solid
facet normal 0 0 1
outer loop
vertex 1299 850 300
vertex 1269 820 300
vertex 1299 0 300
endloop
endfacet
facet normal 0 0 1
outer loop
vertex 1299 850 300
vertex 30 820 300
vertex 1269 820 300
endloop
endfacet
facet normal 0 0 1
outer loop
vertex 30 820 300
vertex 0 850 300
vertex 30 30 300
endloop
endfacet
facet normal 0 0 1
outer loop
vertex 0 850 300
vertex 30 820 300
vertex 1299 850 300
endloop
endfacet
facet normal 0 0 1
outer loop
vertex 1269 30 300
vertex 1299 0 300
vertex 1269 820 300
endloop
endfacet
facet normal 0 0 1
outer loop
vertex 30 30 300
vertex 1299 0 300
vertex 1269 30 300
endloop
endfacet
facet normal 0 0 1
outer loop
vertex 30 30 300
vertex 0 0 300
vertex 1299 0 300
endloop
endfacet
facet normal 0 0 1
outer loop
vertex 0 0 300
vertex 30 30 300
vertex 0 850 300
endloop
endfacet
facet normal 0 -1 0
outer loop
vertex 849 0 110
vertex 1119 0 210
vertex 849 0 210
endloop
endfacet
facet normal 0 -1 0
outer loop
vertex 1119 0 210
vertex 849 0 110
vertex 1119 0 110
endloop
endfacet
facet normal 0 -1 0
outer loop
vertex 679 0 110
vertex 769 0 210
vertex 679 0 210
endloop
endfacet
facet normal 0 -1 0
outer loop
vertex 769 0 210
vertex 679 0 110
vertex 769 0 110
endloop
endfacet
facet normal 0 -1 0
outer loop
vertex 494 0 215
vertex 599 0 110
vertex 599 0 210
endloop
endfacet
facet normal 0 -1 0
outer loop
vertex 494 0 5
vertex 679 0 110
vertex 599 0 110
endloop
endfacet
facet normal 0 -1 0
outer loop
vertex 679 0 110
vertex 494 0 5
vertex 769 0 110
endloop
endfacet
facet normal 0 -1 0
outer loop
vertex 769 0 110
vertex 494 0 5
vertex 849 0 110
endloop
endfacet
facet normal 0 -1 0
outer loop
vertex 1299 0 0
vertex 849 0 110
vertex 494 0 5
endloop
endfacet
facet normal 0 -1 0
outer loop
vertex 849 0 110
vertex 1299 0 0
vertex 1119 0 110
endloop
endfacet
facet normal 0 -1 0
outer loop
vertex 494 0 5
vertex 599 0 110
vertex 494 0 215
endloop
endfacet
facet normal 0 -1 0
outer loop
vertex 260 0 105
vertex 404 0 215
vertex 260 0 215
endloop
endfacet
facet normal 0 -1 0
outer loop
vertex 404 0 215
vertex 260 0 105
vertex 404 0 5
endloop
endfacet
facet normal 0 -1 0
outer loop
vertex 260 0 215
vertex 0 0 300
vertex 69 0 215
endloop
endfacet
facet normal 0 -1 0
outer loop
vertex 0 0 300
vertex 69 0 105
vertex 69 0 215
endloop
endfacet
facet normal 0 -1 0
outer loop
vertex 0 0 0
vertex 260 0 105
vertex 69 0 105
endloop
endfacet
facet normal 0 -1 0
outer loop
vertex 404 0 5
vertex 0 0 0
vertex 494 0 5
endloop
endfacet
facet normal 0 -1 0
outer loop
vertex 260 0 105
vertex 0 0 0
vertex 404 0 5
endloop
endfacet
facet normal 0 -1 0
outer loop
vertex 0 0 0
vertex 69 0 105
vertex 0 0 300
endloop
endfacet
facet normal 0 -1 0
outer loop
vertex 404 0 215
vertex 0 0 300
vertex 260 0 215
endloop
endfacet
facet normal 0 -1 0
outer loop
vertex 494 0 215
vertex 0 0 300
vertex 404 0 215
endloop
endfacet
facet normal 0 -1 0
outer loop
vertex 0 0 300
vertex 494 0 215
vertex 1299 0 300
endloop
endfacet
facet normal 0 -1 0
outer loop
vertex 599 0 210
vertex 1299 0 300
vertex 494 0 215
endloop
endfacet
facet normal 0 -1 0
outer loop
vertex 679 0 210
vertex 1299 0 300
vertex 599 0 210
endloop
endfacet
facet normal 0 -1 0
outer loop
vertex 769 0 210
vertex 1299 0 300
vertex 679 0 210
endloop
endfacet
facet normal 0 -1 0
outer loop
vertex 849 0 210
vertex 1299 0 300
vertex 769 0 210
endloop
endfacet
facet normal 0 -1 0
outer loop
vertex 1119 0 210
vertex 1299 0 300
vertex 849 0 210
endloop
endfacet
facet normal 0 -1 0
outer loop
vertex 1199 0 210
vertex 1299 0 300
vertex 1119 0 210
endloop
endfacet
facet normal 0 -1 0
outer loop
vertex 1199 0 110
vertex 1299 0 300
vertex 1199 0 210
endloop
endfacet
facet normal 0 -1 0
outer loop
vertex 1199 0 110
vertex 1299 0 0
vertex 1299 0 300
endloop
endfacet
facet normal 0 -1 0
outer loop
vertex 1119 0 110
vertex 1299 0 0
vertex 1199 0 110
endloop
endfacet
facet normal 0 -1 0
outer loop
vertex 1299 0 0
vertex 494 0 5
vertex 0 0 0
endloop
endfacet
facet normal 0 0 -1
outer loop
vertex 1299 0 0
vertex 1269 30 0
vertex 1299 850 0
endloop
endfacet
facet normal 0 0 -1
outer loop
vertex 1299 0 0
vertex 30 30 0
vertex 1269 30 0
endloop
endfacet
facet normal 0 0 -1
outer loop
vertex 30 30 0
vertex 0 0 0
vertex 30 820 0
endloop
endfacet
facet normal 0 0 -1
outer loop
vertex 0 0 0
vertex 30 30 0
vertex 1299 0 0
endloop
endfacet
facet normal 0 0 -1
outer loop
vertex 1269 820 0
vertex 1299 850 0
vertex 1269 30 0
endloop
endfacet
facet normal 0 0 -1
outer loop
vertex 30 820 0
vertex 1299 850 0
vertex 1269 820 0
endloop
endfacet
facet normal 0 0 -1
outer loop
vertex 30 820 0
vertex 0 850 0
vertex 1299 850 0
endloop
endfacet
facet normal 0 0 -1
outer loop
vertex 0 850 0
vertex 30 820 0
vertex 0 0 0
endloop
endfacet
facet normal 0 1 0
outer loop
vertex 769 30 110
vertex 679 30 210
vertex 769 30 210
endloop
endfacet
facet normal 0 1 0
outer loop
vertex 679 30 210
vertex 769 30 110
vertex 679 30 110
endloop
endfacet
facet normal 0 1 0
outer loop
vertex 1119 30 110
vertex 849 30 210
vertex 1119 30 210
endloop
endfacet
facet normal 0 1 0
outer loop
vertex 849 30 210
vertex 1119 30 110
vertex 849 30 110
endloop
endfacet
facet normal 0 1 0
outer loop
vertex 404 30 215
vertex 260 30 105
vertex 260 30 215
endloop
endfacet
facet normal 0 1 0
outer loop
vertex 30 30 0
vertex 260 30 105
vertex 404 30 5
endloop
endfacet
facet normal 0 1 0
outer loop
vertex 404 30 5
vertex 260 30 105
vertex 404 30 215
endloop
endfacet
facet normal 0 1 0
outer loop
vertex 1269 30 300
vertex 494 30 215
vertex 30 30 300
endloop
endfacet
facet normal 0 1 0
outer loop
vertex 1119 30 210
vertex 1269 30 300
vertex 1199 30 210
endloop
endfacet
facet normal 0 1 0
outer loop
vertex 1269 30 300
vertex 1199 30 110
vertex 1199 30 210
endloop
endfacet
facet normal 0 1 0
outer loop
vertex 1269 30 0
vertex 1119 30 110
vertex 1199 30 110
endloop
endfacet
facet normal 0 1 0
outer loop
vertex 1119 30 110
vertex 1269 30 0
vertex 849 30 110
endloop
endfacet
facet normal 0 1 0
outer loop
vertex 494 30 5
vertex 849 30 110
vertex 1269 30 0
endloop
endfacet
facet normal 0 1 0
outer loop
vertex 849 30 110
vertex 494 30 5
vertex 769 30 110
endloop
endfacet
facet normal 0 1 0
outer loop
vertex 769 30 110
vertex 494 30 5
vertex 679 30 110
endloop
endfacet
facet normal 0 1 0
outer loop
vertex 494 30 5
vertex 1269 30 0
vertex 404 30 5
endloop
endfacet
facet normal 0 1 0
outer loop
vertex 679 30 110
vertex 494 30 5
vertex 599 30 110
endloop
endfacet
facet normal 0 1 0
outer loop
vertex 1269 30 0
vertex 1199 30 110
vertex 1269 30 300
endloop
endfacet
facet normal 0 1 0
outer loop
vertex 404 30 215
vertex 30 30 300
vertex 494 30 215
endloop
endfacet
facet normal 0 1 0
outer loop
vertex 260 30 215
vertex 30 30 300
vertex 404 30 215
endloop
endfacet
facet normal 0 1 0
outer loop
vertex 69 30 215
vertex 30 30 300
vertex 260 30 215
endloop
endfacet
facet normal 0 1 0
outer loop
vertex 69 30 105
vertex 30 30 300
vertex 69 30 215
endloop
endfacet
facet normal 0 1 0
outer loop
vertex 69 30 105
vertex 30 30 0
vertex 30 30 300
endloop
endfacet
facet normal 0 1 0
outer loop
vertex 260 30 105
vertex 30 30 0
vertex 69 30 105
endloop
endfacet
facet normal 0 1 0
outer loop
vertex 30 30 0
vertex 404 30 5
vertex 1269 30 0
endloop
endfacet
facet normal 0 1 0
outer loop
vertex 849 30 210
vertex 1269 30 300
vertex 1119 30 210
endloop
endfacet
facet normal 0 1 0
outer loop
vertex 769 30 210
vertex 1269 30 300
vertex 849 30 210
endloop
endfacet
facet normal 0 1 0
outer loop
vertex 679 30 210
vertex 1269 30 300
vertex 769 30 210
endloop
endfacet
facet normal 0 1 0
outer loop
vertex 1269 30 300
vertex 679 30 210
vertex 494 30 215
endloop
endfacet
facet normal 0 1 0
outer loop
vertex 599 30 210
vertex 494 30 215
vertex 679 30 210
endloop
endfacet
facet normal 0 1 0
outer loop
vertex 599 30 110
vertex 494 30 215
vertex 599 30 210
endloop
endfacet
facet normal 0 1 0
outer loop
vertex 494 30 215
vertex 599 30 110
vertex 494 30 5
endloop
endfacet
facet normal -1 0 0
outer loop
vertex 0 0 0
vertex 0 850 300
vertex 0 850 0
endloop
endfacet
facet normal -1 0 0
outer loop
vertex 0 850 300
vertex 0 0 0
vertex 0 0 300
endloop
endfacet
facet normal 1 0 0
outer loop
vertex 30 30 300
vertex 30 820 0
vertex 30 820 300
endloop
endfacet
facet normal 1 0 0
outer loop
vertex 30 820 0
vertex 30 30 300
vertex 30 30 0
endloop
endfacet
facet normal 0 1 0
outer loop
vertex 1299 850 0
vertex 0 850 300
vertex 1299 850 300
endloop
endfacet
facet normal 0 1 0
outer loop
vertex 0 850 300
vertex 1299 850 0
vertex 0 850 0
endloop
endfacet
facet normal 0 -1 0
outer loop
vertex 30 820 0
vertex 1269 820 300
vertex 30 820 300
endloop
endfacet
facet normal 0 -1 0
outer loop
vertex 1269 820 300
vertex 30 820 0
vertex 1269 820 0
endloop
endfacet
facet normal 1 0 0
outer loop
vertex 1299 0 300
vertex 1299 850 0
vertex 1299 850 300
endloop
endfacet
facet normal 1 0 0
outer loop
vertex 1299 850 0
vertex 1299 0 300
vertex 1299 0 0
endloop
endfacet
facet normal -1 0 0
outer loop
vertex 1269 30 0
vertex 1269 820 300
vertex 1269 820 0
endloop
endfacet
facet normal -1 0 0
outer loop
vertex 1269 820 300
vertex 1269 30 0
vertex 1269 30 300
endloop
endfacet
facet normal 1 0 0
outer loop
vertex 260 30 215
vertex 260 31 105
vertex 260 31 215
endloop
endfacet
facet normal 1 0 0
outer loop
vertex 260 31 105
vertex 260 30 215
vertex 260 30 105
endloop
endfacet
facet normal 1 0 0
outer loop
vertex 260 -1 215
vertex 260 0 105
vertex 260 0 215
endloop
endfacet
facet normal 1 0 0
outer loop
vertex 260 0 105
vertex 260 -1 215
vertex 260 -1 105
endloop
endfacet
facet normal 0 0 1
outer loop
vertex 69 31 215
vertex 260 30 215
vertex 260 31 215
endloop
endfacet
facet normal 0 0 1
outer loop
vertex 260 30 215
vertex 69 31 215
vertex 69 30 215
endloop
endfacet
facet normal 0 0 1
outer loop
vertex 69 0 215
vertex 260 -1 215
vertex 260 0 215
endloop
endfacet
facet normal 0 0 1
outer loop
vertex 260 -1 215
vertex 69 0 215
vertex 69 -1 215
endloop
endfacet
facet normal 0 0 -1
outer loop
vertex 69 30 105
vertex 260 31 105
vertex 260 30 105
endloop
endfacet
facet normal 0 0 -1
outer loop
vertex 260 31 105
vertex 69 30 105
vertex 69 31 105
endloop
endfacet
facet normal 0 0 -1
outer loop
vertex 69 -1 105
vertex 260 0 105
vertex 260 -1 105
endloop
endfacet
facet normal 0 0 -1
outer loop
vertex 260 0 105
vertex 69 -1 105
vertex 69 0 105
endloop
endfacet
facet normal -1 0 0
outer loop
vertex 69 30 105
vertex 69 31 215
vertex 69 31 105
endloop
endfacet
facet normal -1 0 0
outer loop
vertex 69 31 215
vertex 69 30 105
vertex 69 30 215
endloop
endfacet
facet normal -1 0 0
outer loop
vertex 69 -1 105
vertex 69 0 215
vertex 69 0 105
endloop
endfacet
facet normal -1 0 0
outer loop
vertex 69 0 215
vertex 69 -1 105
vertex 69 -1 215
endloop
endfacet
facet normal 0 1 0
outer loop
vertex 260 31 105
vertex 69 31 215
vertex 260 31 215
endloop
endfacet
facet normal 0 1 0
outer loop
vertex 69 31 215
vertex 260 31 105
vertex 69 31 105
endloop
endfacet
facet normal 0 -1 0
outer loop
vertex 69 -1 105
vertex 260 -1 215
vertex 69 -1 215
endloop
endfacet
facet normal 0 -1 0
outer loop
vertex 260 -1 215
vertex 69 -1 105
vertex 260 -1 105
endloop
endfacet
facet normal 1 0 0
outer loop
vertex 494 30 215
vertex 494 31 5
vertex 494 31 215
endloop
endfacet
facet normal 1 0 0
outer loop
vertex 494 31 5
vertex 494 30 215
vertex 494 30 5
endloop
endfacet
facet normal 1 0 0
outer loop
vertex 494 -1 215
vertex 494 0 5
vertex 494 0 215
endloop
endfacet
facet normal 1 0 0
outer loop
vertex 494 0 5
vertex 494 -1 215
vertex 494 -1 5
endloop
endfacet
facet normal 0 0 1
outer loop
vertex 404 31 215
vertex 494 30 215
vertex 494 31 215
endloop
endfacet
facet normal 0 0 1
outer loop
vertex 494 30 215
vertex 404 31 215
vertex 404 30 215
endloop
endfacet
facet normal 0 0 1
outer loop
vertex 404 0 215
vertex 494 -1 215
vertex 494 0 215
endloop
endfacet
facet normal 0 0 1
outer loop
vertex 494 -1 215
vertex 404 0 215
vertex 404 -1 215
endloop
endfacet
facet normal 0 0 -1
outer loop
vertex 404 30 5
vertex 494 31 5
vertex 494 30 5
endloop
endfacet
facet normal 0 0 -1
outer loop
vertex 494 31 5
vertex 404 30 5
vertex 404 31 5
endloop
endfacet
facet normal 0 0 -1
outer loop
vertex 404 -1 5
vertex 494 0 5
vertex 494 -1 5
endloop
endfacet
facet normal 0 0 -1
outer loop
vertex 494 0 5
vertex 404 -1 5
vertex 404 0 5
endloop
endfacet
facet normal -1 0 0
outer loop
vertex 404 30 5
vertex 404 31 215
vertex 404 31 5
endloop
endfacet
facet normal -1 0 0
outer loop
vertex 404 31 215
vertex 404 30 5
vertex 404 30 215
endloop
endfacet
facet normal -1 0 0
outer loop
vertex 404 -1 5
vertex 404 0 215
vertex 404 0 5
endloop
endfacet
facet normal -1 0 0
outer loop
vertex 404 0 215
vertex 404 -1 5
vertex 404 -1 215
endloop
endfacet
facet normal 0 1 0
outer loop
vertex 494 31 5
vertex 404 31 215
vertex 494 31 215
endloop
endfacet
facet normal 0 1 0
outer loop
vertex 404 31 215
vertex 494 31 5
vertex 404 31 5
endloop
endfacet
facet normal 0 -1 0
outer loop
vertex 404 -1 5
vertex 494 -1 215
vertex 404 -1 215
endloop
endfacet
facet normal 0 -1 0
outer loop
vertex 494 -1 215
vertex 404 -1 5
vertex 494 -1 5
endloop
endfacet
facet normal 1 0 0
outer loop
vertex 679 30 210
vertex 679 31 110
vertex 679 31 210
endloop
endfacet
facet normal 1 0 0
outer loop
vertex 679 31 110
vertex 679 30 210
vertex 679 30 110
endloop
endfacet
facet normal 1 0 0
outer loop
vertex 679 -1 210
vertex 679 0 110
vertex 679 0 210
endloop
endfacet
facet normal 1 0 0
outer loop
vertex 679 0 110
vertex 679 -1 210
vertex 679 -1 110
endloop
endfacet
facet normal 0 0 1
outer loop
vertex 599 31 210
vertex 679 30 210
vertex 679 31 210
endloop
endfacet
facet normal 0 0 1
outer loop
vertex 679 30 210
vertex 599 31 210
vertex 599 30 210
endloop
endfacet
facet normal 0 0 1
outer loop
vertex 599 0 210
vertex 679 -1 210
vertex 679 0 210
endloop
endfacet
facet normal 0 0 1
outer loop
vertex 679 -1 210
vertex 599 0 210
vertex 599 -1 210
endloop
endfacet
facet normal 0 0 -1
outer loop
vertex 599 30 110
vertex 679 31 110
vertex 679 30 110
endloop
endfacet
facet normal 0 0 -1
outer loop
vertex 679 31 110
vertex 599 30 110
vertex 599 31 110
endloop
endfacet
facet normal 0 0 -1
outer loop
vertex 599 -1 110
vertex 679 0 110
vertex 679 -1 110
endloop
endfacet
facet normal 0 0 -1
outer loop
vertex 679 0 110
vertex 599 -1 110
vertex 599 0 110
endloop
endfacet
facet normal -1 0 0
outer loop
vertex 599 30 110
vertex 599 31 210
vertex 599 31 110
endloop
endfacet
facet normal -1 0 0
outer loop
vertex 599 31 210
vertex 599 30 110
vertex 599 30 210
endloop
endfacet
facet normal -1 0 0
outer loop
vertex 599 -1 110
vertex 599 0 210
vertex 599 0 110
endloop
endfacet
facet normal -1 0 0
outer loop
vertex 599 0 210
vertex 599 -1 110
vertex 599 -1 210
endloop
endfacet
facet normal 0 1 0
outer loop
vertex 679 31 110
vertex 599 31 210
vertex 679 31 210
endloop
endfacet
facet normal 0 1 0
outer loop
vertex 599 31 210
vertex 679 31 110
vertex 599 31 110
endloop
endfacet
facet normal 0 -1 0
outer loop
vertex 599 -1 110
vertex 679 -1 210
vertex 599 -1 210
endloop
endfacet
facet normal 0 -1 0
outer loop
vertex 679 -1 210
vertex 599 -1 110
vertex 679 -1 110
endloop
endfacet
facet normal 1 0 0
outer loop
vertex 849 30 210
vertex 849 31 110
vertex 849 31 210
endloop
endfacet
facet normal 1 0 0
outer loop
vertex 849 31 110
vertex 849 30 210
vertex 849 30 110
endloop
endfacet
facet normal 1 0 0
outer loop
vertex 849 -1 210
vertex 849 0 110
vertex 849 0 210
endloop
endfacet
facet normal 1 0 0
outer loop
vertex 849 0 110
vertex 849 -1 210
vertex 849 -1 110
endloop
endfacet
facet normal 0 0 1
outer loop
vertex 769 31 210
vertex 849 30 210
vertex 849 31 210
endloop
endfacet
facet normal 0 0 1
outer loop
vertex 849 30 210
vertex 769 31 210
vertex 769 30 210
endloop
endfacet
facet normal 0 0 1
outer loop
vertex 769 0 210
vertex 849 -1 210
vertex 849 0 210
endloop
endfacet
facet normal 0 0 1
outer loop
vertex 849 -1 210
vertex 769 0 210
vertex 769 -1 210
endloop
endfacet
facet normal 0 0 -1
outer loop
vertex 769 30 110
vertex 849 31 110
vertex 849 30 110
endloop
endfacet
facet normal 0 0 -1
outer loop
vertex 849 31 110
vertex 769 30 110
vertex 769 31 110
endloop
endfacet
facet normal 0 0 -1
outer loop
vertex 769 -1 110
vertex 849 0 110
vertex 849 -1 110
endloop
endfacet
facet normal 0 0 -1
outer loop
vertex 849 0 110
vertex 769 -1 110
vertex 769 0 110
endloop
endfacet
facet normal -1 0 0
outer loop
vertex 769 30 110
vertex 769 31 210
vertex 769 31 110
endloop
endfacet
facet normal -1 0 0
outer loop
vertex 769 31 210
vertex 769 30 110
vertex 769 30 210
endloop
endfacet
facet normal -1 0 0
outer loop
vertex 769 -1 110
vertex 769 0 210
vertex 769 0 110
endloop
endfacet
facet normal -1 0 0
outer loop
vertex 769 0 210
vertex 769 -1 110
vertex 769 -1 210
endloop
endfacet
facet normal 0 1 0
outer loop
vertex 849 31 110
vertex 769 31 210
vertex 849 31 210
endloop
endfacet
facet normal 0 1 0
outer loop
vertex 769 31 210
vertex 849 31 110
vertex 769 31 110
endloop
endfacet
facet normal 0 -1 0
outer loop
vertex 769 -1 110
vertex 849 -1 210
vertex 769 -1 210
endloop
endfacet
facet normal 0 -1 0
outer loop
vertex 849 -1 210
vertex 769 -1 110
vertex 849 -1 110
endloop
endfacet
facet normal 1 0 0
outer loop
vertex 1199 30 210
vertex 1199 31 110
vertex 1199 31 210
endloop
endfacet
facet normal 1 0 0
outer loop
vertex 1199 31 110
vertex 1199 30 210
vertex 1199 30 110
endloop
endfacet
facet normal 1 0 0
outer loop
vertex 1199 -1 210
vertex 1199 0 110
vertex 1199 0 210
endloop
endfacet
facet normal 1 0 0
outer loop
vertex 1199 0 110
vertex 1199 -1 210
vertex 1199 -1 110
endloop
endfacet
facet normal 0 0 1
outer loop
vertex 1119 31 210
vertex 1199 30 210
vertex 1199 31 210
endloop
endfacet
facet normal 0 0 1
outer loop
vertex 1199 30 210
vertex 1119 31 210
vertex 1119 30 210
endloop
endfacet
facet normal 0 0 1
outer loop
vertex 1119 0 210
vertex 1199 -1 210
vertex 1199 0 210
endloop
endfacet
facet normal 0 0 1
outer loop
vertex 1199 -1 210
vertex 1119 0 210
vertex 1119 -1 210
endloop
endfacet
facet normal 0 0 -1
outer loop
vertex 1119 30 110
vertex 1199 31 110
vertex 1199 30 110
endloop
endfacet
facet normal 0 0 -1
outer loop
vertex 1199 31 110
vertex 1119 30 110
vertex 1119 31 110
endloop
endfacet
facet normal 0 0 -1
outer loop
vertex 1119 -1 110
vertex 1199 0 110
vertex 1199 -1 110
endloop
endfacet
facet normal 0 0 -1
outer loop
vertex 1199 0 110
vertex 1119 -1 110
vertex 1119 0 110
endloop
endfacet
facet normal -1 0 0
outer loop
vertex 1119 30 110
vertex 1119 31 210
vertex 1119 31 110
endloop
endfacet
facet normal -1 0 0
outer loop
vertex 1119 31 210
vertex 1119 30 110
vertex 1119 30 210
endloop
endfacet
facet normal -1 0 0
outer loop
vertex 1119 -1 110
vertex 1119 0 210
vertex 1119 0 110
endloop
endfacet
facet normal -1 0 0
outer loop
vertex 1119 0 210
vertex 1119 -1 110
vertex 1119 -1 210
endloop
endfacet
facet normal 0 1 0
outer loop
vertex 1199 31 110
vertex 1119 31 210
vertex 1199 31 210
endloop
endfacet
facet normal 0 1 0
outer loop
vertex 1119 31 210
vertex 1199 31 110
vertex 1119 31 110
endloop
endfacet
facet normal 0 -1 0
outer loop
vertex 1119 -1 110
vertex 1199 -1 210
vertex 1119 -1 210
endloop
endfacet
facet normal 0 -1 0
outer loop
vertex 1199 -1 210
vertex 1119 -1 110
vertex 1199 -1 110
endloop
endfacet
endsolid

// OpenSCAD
// file: door/frontDoor.scad
module frontDoor(width, height, depth, reveal) {
	blackberry = [ 102/255, 0/255, 102/255 ];
	blackberryLight = [ 160/255, 160/255, 160/255 ];

	union() {
		color(blackberry)
		cube([width, depth, height]);
		
		color(blackberryLight)
		translate([reveal, -1, reveal])
		cube([width - reveal * 2, depth + 2, height - reveal * 2]);
	}
}

frontDoor(100, 210, 30, 5);
// file: window/window.scad
module window(width, height, depth, reveal) {
	blackberry = [ 102/255, 0/255, 102/255 ];
	transparent = [ 255/255, 255/255, 255/255 ];

	union() {
		color(blackberry)
		cube([width, depth, height]);
		
		color(transparent)
		translate([reveal, -1, reveal])
		cube([width - reveal * 2, depth + 2, height - reveal * 2]);
	}
}

window(201, 120, 30, 5);
// file: wall/wall.scad
// Massstab 1 entspricht einem cm

module wall(length, height, depth, phased) {
	aPhased = 
		(phased == undef) ? [true, true] : phased;
	aLength = 
		(aPhased[0] && aPhased[1]) ? 
			length - 2 * depth : 
			(aPhased[0] || aPhased[1]) ? 
				length - depth : length;

	union() {
		if(aPhased[0]) {
			rotate([0, 0, 270])
				antiprism(height, depth);
			translate ([depth, -depth, 0])	
				cube(size = [aLength, depth, 
					height]);	
		} else {
			translate ([0, -depth, 0])	
				cube(size = [aLength, depth, 
						height]);	
		}
		if(aPhased[1]) {
			translate ([length - depth, -depth, 0])
				antiprism(height, depth);
		}
	}
}

module antiprism(heihgt, depth) {
	polyhedron ( points = [
			[0, 0, heihgt], 
			[0, depth, heihgt], 
			[depth, depth, heihgt], 
			[0, 0, 0], 
			[0, depth, 0], 
			[depth, depth, 0], ], 
		triangles = [
			[0, 1, 2], 
			[0, 5, 3],
			[4, 1, 0],
			[0, 3, 4],
			[5, 3, 0],
			[0, 2, 5],
			[4, 2, 1],
			[2, 4, 5],
			[5, 4, 3], ]);
}

wall (200, 150, 36);

translate([0, 100, 0])
	wall (200, 150, 36, [true, true]);

translate([0, 200, 0])
	wall (200, 150, 36, [false, true]);

translate([0, 300, 0])
	wall (200, 150, 36, [false, false]);
// main file
// Massstab 1 entspricht einem cm
use <wall/wall.scad>
use <window/window.scad>
use <door/frontDoor.scad>

module groundFloor(width, depth, wallColor, revealColor) {
	color(wallColor)
	union(){
		rotate([0, 0, 180])
			translate([-width, 0, 0])
				wall(width, 300, 30);

		rotate([0, 0, 90])
			translate([0, 0, 0])
				wall(depth, 300, 30);

		rotate([0, 0, 0])
			translate([0, depth, 0])
				wall(width, 300, 30);

		rotate([0, 0, 270])
			translate([-depth, width, 0])
				wall(depth, 300, 30);
	}

	translate([64, 0, 100])
		window(201, 120, 30, 5);

	translate([299 + 100, 0, 0])
		frontDoor(100, 220, 30, 5);

	translate([299 + 290, 0, 100])
		window(100, 120, 30, 10);

	translate([299 + 460, 0, 100])
		window(100, 120, 30, 10);

	translate([299 + 810, 0, 100])
		window(100, 120, 30, 10);	
}

groundFloor(1299, 850, [ 224/255, 224/255, 224/255 ]);
